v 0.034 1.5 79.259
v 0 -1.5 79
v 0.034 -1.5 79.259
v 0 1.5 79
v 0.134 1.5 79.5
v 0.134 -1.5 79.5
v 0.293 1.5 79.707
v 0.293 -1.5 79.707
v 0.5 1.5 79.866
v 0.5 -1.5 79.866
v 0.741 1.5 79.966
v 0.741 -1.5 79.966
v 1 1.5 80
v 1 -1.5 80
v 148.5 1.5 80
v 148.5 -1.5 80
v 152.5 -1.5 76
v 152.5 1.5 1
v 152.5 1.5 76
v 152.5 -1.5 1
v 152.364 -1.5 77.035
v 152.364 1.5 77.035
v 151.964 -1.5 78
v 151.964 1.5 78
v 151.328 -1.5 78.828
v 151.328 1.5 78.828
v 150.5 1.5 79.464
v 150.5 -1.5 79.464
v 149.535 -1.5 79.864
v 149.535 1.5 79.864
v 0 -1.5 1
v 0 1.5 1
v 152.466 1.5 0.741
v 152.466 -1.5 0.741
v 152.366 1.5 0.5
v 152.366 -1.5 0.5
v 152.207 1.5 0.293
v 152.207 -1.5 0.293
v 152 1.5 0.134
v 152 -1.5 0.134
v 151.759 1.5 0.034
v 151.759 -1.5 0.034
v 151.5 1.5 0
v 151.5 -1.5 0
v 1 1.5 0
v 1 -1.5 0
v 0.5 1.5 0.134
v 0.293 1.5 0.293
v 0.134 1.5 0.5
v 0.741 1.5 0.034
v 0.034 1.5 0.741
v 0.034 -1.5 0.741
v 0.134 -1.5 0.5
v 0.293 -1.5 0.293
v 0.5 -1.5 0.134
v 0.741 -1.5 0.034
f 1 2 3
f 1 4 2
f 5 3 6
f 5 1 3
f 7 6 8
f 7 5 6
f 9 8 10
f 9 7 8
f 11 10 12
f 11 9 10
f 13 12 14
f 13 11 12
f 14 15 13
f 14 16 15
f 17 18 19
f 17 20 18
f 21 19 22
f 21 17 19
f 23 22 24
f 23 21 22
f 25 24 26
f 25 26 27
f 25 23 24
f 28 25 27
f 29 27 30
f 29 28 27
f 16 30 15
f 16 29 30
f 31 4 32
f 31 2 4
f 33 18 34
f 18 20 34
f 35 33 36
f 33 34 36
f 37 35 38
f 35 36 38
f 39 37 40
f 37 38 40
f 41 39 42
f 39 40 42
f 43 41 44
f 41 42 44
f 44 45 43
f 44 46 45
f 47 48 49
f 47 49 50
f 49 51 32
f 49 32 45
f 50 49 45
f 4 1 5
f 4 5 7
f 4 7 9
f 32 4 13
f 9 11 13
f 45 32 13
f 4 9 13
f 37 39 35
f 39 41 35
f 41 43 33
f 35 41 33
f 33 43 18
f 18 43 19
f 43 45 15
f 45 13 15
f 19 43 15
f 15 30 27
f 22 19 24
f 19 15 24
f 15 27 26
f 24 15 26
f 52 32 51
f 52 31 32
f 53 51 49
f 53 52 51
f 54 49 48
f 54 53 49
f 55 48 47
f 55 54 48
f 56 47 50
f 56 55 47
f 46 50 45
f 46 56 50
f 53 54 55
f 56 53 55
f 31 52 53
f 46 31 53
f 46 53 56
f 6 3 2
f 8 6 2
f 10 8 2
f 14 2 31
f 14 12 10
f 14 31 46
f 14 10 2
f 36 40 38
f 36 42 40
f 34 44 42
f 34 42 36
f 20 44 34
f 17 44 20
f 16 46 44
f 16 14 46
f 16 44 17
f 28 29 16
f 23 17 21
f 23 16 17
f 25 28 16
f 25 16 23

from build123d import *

# Parameters (mm, degrees)
F1_DEPTH = 1.5
F2_R     = 1


with BuildPart() as f1:
    # F0 (on Front) → F1 (new body, symmetric)
    with BuildSketch(Plane.XZ):
        with BuildLine():
            Line((0, 80), (0, 0))
            Line((0, 0), (152.5, 0))
            Line((152.5, 0), (152.5, 76))
            ThreePointArc((152.5, 76), (151.328427, 78.828427), (148.5, 80))
            Line((148.5, 80), (0, 80))
        make_face()
    extrude(amount=F1_DEPTH, both=True)

    # F2
    f2_edges = [f1.edges().sort_by_distance(p)[0] for p in [
        (152.5, 0, 0),
        (0, 0, 80),
        (0, 0, 0),
    ]]
    fillet(f2_edges, radius=F2_R)


solid = f1.part
